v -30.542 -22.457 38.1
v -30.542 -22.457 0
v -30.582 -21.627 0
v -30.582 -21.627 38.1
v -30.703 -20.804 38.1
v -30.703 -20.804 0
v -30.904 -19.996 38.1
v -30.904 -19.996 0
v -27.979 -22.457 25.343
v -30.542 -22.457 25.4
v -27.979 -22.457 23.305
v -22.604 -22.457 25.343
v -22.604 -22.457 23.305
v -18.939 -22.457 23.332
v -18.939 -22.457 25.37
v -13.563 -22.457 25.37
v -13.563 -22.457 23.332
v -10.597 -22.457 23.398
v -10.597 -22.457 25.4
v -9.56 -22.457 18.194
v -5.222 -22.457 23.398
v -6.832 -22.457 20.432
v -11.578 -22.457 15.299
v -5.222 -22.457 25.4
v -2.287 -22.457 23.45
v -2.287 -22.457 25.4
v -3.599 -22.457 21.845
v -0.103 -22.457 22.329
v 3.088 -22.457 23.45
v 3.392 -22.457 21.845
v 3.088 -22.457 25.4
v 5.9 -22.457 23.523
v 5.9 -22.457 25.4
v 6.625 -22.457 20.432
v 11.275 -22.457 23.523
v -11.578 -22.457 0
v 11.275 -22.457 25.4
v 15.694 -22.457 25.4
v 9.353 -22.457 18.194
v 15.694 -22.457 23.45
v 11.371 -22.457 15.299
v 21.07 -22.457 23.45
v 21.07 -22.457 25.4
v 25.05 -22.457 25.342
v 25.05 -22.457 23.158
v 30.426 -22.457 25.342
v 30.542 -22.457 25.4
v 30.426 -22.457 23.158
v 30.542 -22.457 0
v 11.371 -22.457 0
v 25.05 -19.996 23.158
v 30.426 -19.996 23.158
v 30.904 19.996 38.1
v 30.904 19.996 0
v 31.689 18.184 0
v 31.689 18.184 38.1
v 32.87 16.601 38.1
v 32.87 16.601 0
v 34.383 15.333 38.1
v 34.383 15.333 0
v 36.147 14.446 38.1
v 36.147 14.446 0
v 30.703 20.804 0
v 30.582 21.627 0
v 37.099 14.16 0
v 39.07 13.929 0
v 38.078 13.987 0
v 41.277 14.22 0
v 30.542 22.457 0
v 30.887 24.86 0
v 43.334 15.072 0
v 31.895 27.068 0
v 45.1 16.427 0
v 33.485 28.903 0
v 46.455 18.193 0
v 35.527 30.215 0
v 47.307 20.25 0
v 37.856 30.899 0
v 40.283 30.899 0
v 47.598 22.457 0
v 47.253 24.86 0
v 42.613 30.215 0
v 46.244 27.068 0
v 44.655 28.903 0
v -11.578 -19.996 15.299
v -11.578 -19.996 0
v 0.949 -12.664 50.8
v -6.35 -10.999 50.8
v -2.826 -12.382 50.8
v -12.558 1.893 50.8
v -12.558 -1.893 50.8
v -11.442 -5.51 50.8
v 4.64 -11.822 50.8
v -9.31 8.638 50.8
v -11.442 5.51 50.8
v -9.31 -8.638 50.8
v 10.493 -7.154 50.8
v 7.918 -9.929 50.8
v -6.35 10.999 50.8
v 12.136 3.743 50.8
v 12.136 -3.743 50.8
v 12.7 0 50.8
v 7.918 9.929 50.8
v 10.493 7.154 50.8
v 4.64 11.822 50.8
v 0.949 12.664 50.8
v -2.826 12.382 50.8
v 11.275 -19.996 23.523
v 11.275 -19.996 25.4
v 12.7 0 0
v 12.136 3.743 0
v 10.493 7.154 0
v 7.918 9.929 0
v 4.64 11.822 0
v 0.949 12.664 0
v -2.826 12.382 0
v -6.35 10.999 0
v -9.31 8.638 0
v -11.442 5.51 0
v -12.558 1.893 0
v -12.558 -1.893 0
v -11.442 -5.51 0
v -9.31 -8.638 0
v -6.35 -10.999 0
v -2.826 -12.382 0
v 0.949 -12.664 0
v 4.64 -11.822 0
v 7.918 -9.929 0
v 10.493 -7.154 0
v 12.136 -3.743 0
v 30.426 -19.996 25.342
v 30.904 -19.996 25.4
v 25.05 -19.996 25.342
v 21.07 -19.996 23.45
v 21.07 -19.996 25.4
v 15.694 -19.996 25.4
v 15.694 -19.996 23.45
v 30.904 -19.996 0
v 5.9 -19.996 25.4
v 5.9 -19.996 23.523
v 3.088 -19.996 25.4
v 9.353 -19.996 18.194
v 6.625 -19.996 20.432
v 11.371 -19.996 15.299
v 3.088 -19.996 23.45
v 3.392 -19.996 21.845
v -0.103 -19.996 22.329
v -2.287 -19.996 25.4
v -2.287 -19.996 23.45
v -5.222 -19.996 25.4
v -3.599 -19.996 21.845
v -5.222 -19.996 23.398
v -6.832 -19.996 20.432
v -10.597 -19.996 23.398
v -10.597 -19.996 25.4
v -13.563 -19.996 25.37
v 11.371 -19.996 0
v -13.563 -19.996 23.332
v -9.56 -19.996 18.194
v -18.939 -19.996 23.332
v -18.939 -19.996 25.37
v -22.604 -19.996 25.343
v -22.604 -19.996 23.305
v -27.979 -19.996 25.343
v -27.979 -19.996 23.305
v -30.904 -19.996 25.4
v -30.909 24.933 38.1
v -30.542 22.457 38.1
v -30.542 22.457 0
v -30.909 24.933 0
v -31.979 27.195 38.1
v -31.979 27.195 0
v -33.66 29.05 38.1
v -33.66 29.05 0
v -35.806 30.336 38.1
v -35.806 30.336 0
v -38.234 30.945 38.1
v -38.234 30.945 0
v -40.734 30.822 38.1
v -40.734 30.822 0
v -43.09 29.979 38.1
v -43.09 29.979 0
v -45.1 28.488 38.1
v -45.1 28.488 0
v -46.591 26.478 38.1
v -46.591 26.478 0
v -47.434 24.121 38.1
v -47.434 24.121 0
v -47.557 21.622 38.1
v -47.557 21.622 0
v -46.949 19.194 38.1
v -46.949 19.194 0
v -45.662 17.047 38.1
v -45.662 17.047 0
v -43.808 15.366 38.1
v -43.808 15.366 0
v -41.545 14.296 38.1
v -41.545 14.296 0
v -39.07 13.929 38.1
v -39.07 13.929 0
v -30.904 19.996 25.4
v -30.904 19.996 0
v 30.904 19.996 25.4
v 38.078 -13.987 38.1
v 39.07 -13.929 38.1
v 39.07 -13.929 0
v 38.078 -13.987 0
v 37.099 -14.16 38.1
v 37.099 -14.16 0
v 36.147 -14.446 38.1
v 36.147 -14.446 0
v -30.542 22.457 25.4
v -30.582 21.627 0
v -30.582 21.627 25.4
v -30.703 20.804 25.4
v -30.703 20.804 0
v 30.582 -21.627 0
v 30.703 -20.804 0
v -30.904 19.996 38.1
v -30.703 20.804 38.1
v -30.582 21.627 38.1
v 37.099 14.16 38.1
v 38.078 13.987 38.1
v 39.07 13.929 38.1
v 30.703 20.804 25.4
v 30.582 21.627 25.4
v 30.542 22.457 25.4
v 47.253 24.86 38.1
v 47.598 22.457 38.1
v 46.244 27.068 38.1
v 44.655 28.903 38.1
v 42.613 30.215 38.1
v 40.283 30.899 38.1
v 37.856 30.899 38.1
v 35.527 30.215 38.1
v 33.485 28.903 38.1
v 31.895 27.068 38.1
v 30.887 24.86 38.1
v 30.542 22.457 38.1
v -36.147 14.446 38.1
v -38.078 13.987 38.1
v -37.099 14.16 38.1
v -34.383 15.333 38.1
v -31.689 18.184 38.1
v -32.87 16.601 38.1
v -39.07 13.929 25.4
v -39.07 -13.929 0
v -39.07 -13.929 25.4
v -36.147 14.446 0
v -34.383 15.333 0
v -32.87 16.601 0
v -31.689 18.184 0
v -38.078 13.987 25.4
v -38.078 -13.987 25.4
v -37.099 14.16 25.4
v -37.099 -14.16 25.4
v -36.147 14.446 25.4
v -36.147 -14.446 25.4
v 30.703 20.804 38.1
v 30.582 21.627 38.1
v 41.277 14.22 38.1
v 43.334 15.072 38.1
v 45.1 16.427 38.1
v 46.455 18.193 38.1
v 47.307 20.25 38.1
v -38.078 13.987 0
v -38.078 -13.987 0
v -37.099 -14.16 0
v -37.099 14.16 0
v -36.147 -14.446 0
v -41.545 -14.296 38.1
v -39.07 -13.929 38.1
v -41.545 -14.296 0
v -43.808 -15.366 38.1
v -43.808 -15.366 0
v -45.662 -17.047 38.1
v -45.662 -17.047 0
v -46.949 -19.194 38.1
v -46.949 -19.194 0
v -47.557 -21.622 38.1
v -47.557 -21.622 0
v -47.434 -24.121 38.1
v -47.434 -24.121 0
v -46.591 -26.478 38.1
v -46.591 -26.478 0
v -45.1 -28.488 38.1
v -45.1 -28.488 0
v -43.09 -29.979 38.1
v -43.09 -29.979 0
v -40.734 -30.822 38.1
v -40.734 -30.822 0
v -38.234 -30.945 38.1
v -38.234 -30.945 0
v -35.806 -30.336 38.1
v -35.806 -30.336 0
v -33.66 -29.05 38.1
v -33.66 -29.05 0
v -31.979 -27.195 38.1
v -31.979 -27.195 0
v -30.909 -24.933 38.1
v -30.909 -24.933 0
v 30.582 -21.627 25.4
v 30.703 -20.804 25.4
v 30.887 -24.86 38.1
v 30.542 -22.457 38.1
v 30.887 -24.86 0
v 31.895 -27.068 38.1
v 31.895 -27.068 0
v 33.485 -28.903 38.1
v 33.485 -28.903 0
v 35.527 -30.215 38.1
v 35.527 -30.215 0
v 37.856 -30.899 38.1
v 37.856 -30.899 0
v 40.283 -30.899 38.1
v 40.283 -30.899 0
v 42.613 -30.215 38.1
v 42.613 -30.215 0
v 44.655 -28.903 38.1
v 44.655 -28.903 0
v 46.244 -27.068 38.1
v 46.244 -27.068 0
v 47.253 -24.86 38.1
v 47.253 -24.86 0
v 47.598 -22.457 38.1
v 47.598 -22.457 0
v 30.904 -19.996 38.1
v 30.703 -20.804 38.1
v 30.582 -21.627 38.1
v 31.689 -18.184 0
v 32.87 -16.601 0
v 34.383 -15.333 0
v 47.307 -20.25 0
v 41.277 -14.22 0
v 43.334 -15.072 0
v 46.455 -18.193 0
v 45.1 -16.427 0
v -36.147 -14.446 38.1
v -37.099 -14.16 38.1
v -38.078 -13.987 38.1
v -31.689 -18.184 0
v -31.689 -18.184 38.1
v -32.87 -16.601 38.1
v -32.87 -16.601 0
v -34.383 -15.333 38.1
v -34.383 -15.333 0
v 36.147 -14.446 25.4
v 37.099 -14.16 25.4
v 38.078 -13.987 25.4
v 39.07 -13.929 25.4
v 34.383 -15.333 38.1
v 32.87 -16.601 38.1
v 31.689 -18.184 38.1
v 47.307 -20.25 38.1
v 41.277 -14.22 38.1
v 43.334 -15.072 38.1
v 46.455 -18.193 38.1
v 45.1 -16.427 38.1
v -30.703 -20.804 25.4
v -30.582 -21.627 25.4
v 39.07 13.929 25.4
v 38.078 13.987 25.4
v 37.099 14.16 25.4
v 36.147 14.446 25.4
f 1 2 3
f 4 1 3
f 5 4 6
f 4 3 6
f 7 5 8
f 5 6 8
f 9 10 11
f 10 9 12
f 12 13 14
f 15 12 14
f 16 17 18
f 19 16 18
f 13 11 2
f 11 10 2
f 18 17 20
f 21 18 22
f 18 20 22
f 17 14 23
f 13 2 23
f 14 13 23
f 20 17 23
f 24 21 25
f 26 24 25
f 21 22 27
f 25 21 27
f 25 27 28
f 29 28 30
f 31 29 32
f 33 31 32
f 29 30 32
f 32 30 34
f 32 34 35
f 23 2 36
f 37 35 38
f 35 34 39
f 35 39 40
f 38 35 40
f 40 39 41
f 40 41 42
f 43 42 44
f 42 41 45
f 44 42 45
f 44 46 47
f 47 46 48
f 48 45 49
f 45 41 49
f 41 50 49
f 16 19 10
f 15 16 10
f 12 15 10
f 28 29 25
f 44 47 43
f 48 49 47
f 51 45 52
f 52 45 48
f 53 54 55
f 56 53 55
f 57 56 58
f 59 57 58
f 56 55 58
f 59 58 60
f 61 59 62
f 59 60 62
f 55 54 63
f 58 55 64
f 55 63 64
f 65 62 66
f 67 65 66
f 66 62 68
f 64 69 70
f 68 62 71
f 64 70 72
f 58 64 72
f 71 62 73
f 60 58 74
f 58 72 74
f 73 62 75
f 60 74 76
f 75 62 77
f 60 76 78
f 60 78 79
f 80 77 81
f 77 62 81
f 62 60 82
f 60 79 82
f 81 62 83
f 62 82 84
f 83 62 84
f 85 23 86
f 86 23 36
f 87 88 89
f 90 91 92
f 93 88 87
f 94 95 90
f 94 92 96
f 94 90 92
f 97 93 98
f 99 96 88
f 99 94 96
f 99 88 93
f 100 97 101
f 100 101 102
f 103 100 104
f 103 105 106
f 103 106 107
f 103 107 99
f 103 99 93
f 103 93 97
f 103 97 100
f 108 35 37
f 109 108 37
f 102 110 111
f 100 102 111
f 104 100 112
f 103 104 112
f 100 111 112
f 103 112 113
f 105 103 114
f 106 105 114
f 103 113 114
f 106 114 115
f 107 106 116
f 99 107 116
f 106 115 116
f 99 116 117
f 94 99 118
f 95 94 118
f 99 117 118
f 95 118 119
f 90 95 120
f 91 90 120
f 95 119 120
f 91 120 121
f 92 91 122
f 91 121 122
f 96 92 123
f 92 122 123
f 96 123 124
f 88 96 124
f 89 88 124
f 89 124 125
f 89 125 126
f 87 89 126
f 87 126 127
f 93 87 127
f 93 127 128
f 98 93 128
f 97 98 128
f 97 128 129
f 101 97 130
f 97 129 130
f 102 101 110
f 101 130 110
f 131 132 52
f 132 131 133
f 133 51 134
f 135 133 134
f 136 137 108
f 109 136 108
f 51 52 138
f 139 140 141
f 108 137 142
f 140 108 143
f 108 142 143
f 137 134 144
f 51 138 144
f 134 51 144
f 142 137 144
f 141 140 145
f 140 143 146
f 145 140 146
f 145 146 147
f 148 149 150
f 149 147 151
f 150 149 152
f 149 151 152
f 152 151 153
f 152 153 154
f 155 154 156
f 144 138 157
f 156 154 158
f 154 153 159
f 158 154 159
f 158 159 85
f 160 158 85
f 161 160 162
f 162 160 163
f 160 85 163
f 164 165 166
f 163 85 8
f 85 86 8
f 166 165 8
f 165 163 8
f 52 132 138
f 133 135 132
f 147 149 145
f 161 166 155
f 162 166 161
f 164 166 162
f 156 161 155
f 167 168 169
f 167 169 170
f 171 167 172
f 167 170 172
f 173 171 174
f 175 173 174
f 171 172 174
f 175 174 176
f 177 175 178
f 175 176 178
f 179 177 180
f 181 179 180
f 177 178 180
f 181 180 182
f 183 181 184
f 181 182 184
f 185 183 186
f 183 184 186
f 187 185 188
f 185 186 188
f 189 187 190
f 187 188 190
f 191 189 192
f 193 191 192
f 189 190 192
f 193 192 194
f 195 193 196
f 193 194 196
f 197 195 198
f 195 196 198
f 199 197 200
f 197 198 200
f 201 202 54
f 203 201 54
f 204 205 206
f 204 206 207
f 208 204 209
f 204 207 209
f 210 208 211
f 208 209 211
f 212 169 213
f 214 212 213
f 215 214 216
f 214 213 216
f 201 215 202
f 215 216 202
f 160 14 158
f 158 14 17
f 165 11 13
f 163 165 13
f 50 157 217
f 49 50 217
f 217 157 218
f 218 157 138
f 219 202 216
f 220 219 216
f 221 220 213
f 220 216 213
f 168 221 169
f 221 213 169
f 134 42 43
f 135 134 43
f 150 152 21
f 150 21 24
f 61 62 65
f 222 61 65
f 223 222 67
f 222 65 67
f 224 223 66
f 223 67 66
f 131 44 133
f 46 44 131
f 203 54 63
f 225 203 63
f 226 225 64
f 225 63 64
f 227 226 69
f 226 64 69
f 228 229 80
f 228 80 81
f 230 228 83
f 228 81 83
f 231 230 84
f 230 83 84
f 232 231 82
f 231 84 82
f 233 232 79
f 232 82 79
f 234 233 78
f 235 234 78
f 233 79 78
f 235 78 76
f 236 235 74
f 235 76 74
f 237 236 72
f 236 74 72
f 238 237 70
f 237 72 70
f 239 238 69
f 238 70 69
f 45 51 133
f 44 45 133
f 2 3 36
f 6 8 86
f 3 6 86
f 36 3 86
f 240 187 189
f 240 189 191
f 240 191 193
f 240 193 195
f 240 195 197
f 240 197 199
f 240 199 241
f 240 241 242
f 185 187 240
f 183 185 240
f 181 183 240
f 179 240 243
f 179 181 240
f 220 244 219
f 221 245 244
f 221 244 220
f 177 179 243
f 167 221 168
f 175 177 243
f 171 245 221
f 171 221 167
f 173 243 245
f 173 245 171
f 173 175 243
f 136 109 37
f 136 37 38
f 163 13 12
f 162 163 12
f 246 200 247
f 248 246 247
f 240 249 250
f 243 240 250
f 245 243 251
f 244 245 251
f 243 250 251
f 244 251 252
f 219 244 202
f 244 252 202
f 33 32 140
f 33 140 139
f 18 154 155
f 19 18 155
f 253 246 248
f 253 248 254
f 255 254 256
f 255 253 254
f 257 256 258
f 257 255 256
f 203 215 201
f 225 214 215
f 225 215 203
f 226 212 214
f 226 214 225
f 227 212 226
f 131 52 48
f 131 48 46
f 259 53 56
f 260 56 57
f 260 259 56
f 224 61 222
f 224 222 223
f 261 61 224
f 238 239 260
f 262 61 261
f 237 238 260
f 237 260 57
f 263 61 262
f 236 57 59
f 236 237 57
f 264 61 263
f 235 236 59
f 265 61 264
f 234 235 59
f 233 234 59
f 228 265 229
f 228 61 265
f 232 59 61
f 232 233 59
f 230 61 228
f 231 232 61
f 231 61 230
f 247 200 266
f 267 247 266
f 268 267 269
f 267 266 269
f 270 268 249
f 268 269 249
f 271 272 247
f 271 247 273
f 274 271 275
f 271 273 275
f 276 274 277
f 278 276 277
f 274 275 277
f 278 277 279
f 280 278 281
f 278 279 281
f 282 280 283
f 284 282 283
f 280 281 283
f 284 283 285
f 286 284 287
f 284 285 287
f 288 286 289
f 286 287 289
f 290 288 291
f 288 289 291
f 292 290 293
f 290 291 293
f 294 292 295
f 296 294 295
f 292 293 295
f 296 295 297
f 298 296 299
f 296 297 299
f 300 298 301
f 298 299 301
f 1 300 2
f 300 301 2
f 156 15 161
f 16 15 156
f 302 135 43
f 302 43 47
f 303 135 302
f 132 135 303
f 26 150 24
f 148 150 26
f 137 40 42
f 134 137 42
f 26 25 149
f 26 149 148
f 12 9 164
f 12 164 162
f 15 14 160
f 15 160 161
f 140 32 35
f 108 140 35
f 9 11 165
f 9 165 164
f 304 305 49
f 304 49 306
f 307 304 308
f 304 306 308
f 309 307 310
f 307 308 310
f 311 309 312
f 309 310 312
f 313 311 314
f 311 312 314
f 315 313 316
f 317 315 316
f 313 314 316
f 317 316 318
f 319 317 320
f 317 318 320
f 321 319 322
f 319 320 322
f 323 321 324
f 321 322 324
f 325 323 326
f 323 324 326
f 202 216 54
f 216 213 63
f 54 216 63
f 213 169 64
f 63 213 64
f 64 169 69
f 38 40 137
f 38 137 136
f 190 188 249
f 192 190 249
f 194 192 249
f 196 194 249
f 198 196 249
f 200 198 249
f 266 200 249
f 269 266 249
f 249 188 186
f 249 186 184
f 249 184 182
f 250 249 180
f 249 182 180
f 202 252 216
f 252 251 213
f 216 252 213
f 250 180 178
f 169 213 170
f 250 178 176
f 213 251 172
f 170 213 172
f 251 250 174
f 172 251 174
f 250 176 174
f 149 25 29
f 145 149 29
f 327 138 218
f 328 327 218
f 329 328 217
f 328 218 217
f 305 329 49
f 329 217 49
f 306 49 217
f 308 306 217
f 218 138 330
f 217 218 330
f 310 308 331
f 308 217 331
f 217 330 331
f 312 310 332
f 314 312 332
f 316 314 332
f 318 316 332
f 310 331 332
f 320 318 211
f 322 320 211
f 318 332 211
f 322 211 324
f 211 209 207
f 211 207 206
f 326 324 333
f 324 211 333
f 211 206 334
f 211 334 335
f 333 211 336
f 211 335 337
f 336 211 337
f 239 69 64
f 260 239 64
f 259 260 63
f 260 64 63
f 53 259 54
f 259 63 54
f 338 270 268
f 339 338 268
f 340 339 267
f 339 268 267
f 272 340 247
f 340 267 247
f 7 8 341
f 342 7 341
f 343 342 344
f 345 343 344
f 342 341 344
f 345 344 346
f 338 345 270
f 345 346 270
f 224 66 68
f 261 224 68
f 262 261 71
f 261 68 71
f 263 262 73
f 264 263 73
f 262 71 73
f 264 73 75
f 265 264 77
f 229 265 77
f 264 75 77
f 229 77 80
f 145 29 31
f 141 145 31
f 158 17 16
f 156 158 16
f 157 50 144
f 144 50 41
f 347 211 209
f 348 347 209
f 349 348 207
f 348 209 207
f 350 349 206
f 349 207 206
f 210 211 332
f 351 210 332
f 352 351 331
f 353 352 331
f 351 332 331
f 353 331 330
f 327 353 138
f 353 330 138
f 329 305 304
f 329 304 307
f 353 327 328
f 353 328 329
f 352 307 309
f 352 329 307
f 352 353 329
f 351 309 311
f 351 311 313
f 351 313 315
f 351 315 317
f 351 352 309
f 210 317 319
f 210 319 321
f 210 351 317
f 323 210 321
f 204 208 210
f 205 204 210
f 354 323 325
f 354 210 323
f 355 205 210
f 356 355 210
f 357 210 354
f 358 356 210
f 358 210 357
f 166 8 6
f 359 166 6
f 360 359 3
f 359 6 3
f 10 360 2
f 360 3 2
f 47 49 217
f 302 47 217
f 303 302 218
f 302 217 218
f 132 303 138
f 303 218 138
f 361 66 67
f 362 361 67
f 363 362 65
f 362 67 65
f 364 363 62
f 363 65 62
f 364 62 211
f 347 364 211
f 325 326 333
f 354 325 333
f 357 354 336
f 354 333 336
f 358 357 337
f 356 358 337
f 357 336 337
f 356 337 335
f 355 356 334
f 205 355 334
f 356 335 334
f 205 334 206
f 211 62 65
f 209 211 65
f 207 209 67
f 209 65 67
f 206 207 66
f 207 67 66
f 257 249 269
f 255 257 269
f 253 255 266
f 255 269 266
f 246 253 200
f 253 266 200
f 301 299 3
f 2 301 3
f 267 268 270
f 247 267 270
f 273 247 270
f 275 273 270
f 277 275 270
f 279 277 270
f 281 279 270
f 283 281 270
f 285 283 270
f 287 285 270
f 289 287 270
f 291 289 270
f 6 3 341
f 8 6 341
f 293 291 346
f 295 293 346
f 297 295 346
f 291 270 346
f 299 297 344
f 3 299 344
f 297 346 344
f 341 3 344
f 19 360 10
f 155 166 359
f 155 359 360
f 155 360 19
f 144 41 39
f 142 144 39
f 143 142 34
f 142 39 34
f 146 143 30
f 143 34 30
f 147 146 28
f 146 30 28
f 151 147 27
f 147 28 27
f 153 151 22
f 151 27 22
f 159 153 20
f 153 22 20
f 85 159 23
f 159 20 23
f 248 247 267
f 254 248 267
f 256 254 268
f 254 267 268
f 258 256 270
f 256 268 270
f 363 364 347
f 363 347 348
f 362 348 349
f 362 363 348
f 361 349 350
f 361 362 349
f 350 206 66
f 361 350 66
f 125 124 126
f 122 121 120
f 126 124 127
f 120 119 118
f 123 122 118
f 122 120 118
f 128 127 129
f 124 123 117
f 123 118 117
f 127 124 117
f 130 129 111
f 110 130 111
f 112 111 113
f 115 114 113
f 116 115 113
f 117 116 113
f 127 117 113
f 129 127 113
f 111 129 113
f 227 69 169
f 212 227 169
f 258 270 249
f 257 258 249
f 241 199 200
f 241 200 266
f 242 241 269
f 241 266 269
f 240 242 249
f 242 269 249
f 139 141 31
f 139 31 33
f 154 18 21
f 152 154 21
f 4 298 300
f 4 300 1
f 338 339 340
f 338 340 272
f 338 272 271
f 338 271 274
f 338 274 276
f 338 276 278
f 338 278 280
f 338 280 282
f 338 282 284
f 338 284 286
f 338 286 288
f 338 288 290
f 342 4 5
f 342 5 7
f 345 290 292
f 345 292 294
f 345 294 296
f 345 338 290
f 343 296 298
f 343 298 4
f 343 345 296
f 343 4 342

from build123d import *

# Parameters (mm, degrees)
F1_DEPTH = 25.4
F2_DEPTH = 38.1
F0_R     = 12.7
F3_DEPTH = 50.8
F4_W     = 5.3753480315
F4_H     = 2.0379073262
F4_H_2   = 2.001611045
F4_H_3   = 1.9500455767
F4_H_4   = 1.8769497931
F4_H_5   = 2.1840970308
F4_H_6   = 2.4033825189
F5_DEPTH = 25.4


with BuildPart() as f1:
    # F0 (on Top) → F1 (new body)
    with BuildSketch(Plane.XY):
        with BuildLine():
            ThreePointArc((30.9043610914, 19.9963377189), (30.6327265804, 21.213579998), (30.5415316269, 22.4574238604))
            Line((30.5415316269, 22.4574238604), (-30.5415316269, 22.4574238604))
            ThreePointArc((-30.5415316269, 22.4574238604), (-30.6327265804, 21.213579998), (-30.9043610914, 19.9963377189))
            Line((-30.9043610914, 19.9963377189), (30.9043610914, 19.9963377189))
        make_face()
    extrude(amount=F1_DEPTH)


with BuildPart() as f1b:
    # F0 (on Top) → F1, piece 2 (new body)
    with BuildSketch(Plane.XY):
        with BuildLine():
            ThreePointArc((-36.1472253967, 14.4455857303), (-37.585860411, 14.059279949), (-39.0697670953, 13.929188392))
            Line((-39.0697670953, 13.929188392), (-39.0697670953, -13.929188392))
            ThreePointArc((-39.0697670953, -13.929188392), (-37.585860411, -14.059279949), (-36.1472253967, -14.4455857303))
            Line((-36.1472253967, -14.4455857303), (-36.1472253967, 14.4455857303))
        make_face()
    extrude(amount=F1_DEPTH)


with BuildPart() as f1c:
    # F0 (on Top) → F1, piece 3 (new body)
    with BuildSketch(Plane.XY):
        with BuildLine():
            ThreePointArc((-30.9043610914, -19.9963377189), (-30.6327265804, -21.213579998), (-30.5415316269, -22.4574238604))
            Line((-30.5415316269, -22.4574238604), (30.5415316269, -22.4574238604))
            ThreePointArc((30.5415316269, -22.4574238604), (30.6327265804, -21.213579998), (30.9043610914, -19.9963377189))
            Line((30.9043610914, -19.9963377189), (-30.9043610914, -19.9963377189))
        make_face()
    extrude(amount=F1_DEPTH)

    # F4 (on face) → F5 (cut)
    with BuildSketch(Plane.XZ.offset(22.4574238604)):
        with BuildLine():
            Line((-11.5776741877, 15.2990696952), (-11.5776741877, 0))
            Line((-11.5776741877, 0), (11.3709308207, 0))
            Line((11.3709308207, 0), (11.3709308207, 15.2990696952))
            ThreePointArc((11.3709308207, 15.2990696952), (-0.1033716835, 22.3287878897), (-11.5776741877, 15.2990696952))
        make_face()
        with Locations((-34.3195348978, 24.3810463369)):
            Rectangle(F4_W, F4_H)
        with Locations((-25.2913832664, 24.3237949908)):
            Rectangle(F4_W, F4_H)
        with Locations((-16.2510816008, 24.3512634188)):
            Rectangle(F4_W, F4_H)
        with Locations((-7.9092020169, 24.3991944775)):
            Rectangle(F4_W, F4_H_2)
        with Locations((0.400578283, 24.4249772117)):
            Rectangle(F4_W, F4_H_3)
        with Locations((8.5872309282, 24.4615251034)):
            Rectangle(F4_W, F4_H_4)
        with Locations((18.3819765225, 24.4249772117)):
            Rectangle(F4_W, F4_H_3)
        with Locations((27.7381502092, 24.249621667)):
            Rectangle(F4_W, F4_H_5)
        with Locations((37.9714630544, 24.3592662737)):
            Rectangle(F4_W, F4_H_6)
    extrude(amount=-F5_DEPTH, mode=Mode.SUBTRACT)


with BuildPart() as f1d:
    # F0 (on Top) → F1, piece 4 (new body)
    with BuildSketch(Plane.XY):
        with BuildLine():
            Line((39.0697670953, -13.929188392), (39.0697670953, 13.929188392))
            ThreePointArc((39.0697670953, 13.929188392), (37.585860411, 14.059279949), (36.1472253967, 14.4455857303))
            Line((36.1472253967, 14.4455857303), (36.1472253967, -14.4455857303))
            ThreePointArc((36.1472253967, -14.4455857303), (37.585860411, -14.059279949), (39.0697670953, -13.929188392))
        make_face()
    extrude(amount=F1_DEPTH)


with BuildPart() as f2:
    # F0 (on Top) → F2 (new body)
    with BuildSketch(Plane.XY):
        with BuildLine():
            ThreePointArc((47.5980025637, 22.4574238604), (39.0697670953, 30.9856593288), (30.5415316269, 22.4574238604))
            ThreePointArc((30.5415316269, 22.4574238604), (30.6327265804, 21.213579998), (30.9043610914, 19.9963377189))
            ThreePointArc((30.9043610914, 19.9963377189), (32.8698995183, 16.6014489432), (36.1472253967, 14.4455857303))
            ThreePointArc((36.1472253967, 14.4455857303), (37.585860411, 14.059279949), (39.0697670953, 13.929188392))
            ThreePointArc((39.0697670953, 13.929188392), (45.1001402266, 16.4270507292), (47.5980025637, 22.4574238604))
        make_face()
    extrude(amount=F2_DEPTH)


with BuildPart() as f2b:
    # F0 (on Top) → F2, piece 2 (new body)
    with BuildSketch(Plane.XY):
        with BuildLine():
            ThreePointArc((47.5980025637, -22.4574238604), (45.1001402266, -16.4270507292), (39.0697670953, -13.929188392))
            ThreePointArc((39.0697670953, -13.929188392), (37.585860411, -14.059279949), (36.1472253967, -14.4455857303))
            ThreePointArc((36.1472253967, -14.4455857303), (32.8698995183, -16.6014489432), (30.9043610914, -19.9963377189))
            ThreePointArc((30.9043610914, -19.9963377189), (30.6327265804, -21.213579998), (30.5415316269, -22.4574238604))
            ThreePointArc((30.5415316269, -22.4574238604), (39.0697670953, -30.9856593288), (47.5980025637, -22.4574238604))
        make_face()
    extrude(amount=F2_DEPTH)


with BuildPart() as f2c:
    # F0 (on Top) → F2, piece 3 (new body)
    with BuildSketch(Plane.XY):
        with BuildLine():
            ThreePointArc((-36.1472253967, -14.4455857303), (-37.585860411, -14.059279949), (-39.0697670953, -13.929188392))
            ThreePointArc((-39.0697670953, -13.929188392), (-45.1001402266, -28.4877969917), (-30.5415316269, -22.4574238604))
            ThreePointArc((-30.5415316269, -22.4574238604), (-30.6327265804, -21.213579998), (-30.9043610914, -19.9963377189))
            ThreePointArc((-30.9043610914, -19.9963377189), (-32.8698995183, -16.6014489432), (-36.1472253967, -14.4455857303))
        make_face()
    extrude(amount=F2_DEPTH)


with BuildPart() as f2d:
    # F0 (on Top) → F2, piece 4 (new body)
    with BuildSketch(Plane.XY):
        with BuildLine():
            ThreePointArc((-30.9043610914, 19.9963377189), (-30.6327265804, 21.213579998), (-30.5415316269, 22.4574238604))
            ThreePointArc((-30.5415316269, 22.4574238604), (-45.1001402266, 28.4877969917), (-39.0697670953, 13.929188392))
            ThreePointArc((-39.0697670953, 13.929188392), (-37.585860411, 14.059279949), (-36.1472253967, 14.4455857303))
            ThreePointArc((-36.1472253967, 14.4455857303), (-32.8698995183, 16.6014489432), (-30.9043610914, 19.9963377189))
        make_face()
    extrude(amount=F2_DEPTH)


with BuildPart() as f3:
    # F0 (on Top) → F3 (new body)
    with BuildSketch(Plane.XY):
        Circle(F0_R)
    extrude(amount=F3_DEPTH)


solid = Compound([f1.part, f1b.part, f1c.part, f1d.part, f2.part, f2b.part, f2c.part, f2d.part, f3.part])
